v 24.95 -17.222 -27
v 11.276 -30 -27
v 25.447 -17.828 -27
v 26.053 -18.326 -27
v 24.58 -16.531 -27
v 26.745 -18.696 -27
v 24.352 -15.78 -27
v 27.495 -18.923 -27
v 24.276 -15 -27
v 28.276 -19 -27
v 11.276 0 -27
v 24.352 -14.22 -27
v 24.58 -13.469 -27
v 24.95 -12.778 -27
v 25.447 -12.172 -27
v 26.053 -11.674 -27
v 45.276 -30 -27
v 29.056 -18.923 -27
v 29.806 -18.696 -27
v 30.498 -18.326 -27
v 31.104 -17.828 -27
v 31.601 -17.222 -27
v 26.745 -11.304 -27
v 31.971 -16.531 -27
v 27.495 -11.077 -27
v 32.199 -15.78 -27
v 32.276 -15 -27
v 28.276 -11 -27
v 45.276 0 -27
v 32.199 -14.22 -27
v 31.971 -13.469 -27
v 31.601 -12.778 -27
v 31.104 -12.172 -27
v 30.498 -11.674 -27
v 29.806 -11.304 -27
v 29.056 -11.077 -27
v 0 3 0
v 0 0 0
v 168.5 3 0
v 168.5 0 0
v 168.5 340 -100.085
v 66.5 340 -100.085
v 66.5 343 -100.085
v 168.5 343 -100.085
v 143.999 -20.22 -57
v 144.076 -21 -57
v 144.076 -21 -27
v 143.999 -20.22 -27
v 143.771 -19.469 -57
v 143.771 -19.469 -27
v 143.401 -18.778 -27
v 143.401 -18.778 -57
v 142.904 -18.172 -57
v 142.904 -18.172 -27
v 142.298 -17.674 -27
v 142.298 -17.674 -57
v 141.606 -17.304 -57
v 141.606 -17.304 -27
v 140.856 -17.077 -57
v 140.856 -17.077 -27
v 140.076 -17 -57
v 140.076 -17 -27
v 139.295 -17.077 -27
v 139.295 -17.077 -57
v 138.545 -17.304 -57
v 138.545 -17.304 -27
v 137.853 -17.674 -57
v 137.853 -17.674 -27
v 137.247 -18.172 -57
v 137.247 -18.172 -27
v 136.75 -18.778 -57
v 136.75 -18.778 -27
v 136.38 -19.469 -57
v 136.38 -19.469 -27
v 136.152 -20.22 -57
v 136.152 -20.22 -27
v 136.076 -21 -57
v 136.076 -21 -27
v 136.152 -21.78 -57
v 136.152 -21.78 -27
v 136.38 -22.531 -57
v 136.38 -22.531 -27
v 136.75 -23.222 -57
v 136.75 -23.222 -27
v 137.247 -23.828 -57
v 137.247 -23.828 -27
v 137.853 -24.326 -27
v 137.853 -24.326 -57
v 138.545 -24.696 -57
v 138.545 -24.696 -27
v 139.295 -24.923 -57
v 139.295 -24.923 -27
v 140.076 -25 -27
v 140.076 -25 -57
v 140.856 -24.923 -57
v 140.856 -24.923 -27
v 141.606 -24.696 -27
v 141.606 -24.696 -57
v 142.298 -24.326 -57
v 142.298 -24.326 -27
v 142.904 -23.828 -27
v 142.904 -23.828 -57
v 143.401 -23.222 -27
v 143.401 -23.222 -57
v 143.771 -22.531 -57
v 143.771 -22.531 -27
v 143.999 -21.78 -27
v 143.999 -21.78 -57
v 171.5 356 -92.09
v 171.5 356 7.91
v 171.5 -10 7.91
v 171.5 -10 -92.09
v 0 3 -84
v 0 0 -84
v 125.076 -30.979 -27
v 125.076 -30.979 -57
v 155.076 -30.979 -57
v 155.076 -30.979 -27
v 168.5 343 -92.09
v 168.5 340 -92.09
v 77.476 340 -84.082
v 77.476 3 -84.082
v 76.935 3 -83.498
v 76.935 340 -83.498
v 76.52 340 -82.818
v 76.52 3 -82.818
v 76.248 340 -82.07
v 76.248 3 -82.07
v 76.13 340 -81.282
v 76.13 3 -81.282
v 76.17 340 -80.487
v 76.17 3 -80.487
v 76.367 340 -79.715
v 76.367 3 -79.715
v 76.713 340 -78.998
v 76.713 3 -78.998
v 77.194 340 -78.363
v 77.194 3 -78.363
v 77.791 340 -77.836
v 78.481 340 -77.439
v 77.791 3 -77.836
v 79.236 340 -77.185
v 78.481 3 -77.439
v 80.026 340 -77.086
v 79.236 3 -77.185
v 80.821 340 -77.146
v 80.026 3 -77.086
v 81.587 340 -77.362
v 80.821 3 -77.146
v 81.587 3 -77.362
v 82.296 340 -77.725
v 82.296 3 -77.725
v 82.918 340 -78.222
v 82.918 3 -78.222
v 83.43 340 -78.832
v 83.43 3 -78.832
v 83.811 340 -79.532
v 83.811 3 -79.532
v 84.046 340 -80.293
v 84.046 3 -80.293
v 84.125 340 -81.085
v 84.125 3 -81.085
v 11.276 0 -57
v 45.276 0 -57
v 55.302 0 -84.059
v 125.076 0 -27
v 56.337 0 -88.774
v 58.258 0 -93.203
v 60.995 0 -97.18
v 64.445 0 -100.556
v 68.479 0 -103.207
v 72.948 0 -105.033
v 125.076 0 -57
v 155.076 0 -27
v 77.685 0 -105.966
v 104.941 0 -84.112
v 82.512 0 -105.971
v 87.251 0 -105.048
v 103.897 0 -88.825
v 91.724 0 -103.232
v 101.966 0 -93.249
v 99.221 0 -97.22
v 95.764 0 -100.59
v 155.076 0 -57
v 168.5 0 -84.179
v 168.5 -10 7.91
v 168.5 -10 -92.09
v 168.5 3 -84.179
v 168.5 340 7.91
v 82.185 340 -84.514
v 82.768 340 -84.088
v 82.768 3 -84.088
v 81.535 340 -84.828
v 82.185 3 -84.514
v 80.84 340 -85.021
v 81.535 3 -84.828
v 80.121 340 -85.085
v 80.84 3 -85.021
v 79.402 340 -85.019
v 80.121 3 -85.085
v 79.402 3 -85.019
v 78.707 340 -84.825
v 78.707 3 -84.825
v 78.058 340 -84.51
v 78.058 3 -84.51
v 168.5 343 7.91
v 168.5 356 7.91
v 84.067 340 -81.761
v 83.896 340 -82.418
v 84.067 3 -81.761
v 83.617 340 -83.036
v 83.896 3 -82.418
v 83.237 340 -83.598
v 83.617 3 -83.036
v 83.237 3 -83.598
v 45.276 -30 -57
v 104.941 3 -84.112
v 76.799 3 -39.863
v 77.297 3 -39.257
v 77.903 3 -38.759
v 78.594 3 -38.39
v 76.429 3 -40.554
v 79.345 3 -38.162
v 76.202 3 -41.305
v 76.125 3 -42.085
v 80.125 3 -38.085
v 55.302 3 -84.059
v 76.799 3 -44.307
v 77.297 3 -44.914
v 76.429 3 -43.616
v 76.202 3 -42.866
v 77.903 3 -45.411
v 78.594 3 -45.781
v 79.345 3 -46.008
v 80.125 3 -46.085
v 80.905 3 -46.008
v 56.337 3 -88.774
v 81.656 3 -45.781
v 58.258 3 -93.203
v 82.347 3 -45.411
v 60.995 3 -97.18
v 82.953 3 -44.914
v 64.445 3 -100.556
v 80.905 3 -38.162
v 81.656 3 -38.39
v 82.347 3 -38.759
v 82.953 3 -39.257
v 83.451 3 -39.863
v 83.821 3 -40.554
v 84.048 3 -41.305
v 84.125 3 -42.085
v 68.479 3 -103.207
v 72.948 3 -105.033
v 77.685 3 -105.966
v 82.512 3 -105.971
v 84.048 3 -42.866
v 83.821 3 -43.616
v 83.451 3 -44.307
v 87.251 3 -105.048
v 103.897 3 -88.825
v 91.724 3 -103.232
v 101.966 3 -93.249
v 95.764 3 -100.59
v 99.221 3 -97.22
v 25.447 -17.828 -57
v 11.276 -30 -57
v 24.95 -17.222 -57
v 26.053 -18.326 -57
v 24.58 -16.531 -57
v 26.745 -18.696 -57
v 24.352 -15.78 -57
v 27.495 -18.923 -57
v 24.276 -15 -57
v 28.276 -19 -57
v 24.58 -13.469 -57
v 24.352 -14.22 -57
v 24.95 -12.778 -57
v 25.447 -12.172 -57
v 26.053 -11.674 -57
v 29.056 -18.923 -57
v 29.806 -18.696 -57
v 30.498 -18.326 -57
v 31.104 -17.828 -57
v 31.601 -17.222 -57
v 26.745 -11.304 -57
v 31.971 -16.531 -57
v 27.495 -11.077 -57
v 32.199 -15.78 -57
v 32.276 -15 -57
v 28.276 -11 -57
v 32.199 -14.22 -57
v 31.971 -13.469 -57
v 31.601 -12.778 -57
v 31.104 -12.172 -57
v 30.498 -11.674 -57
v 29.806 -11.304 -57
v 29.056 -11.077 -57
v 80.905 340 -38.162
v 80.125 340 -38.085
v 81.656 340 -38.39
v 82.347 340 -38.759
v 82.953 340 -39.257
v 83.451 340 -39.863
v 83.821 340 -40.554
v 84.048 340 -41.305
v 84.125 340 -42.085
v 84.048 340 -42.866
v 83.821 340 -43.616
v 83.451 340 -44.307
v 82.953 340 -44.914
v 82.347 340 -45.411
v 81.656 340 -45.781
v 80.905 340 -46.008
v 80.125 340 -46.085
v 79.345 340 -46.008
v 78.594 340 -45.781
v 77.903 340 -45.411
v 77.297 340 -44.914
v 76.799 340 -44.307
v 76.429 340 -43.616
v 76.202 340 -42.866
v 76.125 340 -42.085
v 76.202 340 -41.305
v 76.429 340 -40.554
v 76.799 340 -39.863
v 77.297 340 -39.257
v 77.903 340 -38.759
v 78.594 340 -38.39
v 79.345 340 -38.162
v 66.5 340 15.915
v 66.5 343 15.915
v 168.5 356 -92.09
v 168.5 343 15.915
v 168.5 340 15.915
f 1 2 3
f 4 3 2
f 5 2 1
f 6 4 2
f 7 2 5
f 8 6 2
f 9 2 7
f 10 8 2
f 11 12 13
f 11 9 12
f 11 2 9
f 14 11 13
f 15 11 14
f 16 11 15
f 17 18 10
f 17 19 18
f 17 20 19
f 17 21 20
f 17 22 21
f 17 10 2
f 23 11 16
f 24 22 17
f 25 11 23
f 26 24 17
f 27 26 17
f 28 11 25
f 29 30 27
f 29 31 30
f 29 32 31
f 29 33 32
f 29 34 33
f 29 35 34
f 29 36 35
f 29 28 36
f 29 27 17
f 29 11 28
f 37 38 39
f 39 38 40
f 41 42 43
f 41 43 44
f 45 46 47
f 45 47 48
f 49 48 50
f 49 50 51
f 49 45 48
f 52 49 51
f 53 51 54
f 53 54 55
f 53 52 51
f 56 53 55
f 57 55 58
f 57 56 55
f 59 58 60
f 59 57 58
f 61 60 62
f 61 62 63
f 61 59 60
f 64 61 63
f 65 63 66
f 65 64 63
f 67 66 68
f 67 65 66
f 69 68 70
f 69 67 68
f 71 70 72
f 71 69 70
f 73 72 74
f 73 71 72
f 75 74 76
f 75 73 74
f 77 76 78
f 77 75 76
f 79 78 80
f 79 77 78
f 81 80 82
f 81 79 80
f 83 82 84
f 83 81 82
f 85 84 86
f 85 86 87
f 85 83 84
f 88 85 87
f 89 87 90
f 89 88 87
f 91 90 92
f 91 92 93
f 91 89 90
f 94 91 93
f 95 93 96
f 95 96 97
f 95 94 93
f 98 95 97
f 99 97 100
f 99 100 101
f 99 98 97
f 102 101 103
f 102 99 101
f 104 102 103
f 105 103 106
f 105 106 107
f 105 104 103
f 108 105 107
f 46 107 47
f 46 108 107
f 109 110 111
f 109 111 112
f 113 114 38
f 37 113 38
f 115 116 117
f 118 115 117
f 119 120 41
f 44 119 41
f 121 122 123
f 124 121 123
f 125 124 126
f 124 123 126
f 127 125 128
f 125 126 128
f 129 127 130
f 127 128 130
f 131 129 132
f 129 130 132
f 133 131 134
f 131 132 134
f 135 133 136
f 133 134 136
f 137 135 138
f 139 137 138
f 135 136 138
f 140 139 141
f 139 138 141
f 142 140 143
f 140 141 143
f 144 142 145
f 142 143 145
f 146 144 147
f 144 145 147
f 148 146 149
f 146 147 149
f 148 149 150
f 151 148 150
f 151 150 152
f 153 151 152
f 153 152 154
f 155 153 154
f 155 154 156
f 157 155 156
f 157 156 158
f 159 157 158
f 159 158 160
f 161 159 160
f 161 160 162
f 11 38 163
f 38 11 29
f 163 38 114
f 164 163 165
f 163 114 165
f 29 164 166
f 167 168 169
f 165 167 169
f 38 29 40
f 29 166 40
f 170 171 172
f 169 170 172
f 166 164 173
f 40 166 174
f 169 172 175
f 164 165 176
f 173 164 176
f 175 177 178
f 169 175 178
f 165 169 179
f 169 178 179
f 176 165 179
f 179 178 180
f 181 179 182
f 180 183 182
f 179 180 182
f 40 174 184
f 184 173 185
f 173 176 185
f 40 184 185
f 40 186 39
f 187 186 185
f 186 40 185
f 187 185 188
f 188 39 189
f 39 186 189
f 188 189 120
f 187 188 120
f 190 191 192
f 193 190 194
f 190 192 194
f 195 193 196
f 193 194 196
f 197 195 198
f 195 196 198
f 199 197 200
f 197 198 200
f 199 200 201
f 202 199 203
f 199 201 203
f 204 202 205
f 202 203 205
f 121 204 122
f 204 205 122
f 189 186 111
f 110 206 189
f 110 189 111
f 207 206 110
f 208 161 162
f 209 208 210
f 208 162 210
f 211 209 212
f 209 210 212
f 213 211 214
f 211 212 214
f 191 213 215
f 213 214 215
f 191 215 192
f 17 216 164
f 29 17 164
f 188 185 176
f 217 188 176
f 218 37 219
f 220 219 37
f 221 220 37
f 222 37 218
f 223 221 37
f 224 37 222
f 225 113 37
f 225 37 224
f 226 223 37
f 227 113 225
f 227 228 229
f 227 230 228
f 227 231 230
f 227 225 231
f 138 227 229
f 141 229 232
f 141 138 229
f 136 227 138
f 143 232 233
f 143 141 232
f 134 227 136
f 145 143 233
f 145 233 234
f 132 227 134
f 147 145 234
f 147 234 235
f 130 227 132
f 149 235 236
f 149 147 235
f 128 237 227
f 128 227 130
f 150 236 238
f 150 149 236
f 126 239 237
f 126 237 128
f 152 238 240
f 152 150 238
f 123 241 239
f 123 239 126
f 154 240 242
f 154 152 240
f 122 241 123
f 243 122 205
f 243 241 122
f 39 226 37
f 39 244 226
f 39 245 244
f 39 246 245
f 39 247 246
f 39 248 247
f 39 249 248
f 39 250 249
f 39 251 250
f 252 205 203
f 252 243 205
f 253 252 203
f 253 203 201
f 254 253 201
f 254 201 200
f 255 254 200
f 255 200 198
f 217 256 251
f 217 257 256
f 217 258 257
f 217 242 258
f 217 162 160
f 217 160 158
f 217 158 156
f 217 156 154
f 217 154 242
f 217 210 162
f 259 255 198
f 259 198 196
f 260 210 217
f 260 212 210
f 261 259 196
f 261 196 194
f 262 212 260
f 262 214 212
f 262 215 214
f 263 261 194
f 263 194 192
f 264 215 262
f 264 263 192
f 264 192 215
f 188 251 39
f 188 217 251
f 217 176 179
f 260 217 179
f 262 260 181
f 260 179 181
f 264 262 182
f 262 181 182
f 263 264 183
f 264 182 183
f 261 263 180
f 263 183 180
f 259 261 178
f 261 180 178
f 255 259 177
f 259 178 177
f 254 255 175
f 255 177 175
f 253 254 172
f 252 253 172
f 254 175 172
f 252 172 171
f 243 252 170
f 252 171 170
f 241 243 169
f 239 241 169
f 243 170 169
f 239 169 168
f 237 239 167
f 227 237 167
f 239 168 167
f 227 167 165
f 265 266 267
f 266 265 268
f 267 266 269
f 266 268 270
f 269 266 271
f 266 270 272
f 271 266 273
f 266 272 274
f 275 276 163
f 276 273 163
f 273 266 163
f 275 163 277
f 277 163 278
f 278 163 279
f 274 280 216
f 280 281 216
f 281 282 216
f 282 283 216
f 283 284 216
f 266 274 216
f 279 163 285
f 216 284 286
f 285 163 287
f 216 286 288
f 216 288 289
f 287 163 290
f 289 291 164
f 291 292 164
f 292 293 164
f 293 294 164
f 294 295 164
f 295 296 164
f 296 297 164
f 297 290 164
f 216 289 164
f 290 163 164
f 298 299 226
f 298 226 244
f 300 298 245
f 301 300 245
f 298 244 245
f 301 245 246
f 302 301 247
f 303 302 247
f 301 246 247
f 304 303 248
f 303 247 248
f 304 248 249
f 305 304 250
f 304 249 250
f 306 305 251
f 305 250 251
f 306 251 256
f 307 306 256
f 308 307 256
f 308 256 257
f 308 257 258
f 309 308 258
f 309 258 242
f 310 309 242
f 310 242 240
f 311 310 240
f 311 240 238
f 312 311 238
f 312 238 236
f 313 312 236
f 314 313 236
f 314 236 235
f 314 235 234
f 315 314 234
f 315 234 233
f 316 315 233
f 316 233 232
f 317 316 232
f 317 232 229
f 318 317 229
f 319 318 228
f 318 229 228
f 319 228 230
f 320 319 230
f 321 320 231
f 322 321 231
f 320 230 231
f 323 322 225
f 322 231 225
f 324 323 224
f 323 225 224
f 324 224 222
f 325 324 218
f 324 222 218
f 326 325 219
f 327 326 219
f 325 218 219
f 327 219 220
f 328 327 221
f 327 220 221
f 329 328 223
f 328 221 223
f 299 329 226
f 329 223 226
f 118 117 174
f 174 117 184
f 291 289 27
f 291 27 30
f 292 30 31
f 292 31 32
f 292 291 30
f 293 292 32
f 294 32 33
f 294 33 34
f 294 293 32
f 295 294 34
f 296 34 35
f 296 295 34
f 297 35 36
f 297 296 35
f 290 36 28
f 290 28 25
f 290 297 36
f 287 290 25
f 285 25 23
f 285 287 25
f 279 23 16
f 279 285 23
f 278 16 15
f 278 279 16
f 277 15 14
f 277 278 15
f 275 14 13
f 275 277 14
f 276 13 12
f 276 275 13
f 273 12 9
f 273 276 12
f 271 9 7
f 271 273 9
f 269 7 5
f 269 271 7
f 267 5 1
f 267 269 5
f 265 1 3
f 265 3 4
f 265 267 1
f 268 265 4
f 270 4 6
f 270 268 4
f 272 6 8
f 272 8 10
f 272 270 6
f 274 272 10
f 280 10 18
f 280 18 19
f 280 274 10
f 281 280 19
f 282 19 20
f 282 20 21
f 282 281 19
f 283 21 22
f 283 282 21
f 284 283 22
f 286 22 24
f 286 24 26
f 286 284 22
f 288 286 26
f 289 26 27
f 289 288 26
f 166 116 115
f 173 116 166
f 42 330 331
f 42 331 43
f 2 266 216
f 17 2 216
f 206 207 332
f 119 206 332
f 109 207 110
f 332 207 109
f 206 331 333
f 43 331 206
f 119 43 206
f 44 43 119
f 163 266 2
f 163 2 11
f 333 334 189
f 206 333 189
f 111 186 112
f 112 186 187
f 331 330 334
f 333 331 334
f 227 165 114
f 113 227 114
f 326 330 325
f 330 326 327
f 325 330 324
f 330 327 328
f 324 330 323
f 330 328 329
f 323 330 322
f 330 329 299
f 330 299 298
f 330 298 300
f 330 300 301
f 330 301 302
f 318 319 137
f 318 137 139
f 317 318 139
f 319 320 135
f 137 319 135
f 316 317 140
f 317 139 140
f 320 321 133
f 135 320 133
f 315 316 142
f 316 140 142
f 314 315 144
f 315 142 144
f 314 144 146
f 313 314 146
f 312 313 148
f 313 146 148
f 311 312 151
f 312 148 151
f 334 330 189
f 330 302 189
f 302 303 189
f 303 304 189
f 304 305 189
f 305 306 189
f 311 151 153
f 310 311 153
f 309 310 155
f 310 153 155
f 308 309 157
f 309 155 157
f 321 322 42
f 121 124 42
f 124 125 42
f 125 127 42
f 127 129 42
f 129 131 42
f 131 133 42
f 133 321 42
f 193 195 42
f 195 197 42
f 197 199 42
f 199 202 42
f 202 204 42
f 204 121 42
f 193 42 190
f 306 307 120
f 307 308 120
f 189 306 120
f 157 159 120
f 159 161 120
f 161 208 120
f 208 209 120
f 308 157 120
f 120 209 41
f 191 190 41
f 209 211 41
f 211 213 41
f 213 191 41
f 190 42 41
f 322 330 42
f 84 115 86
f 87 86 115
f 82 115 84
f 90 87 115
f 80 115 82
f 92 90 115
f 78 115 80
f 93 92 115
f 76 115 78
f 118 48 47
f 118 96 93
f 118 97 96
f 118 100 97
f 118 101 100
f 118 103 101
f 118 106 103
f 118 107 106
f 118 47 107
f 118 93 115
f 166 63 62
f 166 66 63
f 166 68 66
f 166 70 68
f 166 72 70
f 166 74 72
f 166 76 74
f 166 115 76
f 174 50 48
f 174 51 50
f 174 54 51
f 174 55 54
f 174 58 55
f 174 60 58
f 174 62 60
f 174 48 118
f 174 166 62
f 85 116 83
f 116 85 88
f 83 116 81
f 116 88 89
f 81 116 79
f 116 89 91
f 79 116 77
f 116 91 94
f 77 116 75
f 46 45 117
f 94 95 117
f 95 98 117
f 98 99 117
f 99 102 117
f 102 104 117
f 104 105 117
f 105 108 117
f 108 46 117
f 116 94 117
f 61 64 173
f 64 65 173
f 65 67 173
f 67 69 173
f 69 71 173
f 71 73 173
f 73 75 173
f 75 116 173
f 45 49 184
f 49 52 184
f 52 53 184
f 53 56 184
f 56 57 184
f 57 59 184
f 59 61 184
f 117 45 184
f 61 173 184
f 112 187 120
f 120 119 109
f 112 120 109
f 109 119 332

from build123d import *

# Parameters (mm, degrees)
SKETCH1_R                 = 4
BOSS_EXTRUDE1_DEPTH       = 3
SKETCH1_3_R               = 4
BOSS_EXTRUDE2_DEPTH       = 340
BOSS_EXTRUDE3_START       = -30
BOSS_EXTRUDE3_OUTLINE_W   = 34
BOSS_EXTRUDE3_OUTLINE_H   = 30
BOSS_EXTRUDE3_OUTLINE_R   = 4
BOSS_EXTRUDE3_OUTLINE_W_2 = 30
BOSS_EXTRUDE3_OUTLINE_H_2 = 30.979171587
BOSS_EXTRUDE3_DEPTH       = 30
SKETCH5_W                 = 100
SKETCH5_H                 = 366
BOSS_EXTRUDE4_DEPTH       = 3
SKETCH6_W                 = 102
SKETCH6_H                 = 116
BOSS_EXTRUDE6_DEPTH       = 3


# Read off the part's stored shape, not the designer's step: Boss-Extrude3
with BuildPart() as part:
    # Sketch1 → Boss-Extrude1 (new body)
    with BuildSketch(Plane(origin=(0, 0, 0), x_dir=(1, 0, 0), z_dir=(0, 1, 0))):
        with BuildLine():
            Line((0, 84), (0, 0))
            Line((0, 0), (168.5, 0))
            Line((168.5, 0), (168.5, 84.179067966))
            Line((168.5, 84.179067966), (104.941145125, 84.111522833))
            ThreePointArc((104.941145125, 84.111522833), (80.098432068, 106.08513446), (55.302478571, 84.058770934))
            Line((55.302478571, 84.058770934), (0, 84))
        make_face()
        with Locations(Location((80.125, 42.085148577, 0), (0, 0, 270))):
            Circle(SKETCH1_R, mode=Mode.SUBTRACT)
        with Locations(Location((80.125, 81.085148577, 0), (0, 0, 270))):
            Circle(SKETCH1_R, mode=Mode.SUBTRACT)
    extrude(amount=BOSS_EXTRUDE1_DEPTH)

    # Sketch1<3> → Boss-Extrude2 (add)
    with BuildSketch(Plane(origin=(0, 0, 0), x_dir=(1, 0, 0), z_dir=(0, 1, 0))):
        with BuildLine():
            ThreePointArc((82.767561665, 84.087958569), (80.120749131, 85.085146319), (77.476062031, 84.082335198))
            Line((77.476062031, 84.082335198), (82.767561665, 84.087958569))
        make_face()
        with BuildLine():
            Line((82.767561665, 84.087958569), (77.476062031, 84.082335198))
            ThreePointArc((77.476062031, 84.082335198), (78.481186123, 77.438523297), (84.125, 81.085148577))
            ThreePointArc((84.125, 81.085148577), (83.769876312, 82.732836858), (82.767561665, 84.087958569))
        make_face()
        with Locations(Location((80.125, 42.085148577, 0), (0, 0, 270))):
            Circle(SKETCH1_3_R)
    extrude(amount=BOSS_EXTRUDE2_DEPTH)

    # Boss-Extrude3 outline → Boss-Extrude3 (add)
    # profile 1 of 2: a face of its own
    with BuildSketch(Plane.XY.offset(-27).offset(BOSS_EXTRUDE3_START)):
        with Locations((28.275525376, -15)):
            Rectangle(BOSS_EXTRUDE3_OUTLINE_W, BOSS_EXTRUDE3_OUTLINE_H)
        with Locations((28.275525376, -15)):
            Circle(BOSS_EXTRUDE3_OUTLINE_R, mode=Mode.SUBTRACT)
    # profile 2 of 2: a face of its own
    with BuildSketch(Plane.XY.offset(-27).offset(BOSS_EXTRUDE3_START)):
        with Locations((140.075525376, -15.489585794)):
            Rectangle(BOSS_EXTRUDE3_OUTLINE_W_2, BOSS_EXTRUDE3_OUTLINE_H_2)
        with Locations((140.075525376, -21)):
            Circle(BOSS_EXTRUDE3_OUTLINE_R, mode=Mode.SUBTRACT)
    extrude(amount=BOSS_EXTRUDE3_DEPTH)

    # Sketch5 → Boss-Extrude4 (add)
    with BuildSketch(Plane(origin=(168.5, 0, 0), x_dir=(0, 0, -1), z_dir=(1, 0, 0))):
        with Locations((42.089533983, 173)):
            Rectangle(SKETCH5_W, SKETCH5_H)
    extrude(amount=BOSS_EXTRUDE4_DEPTH)

    # Sketch6 → Boss-Extrude6 (add)
    with BuildSketch(Plane(origin=(0, 340, 0), x_dir=(1, 0, 0), z_dir=(0, 1, 0))):
        with Locations((117.5, 42.085148577)):
            Rectangle(SKETCH6_W, SKETCH6_H)
    extrude(amount=BOSS_EXTRUDE6_DEPTH)


solid = part.part
